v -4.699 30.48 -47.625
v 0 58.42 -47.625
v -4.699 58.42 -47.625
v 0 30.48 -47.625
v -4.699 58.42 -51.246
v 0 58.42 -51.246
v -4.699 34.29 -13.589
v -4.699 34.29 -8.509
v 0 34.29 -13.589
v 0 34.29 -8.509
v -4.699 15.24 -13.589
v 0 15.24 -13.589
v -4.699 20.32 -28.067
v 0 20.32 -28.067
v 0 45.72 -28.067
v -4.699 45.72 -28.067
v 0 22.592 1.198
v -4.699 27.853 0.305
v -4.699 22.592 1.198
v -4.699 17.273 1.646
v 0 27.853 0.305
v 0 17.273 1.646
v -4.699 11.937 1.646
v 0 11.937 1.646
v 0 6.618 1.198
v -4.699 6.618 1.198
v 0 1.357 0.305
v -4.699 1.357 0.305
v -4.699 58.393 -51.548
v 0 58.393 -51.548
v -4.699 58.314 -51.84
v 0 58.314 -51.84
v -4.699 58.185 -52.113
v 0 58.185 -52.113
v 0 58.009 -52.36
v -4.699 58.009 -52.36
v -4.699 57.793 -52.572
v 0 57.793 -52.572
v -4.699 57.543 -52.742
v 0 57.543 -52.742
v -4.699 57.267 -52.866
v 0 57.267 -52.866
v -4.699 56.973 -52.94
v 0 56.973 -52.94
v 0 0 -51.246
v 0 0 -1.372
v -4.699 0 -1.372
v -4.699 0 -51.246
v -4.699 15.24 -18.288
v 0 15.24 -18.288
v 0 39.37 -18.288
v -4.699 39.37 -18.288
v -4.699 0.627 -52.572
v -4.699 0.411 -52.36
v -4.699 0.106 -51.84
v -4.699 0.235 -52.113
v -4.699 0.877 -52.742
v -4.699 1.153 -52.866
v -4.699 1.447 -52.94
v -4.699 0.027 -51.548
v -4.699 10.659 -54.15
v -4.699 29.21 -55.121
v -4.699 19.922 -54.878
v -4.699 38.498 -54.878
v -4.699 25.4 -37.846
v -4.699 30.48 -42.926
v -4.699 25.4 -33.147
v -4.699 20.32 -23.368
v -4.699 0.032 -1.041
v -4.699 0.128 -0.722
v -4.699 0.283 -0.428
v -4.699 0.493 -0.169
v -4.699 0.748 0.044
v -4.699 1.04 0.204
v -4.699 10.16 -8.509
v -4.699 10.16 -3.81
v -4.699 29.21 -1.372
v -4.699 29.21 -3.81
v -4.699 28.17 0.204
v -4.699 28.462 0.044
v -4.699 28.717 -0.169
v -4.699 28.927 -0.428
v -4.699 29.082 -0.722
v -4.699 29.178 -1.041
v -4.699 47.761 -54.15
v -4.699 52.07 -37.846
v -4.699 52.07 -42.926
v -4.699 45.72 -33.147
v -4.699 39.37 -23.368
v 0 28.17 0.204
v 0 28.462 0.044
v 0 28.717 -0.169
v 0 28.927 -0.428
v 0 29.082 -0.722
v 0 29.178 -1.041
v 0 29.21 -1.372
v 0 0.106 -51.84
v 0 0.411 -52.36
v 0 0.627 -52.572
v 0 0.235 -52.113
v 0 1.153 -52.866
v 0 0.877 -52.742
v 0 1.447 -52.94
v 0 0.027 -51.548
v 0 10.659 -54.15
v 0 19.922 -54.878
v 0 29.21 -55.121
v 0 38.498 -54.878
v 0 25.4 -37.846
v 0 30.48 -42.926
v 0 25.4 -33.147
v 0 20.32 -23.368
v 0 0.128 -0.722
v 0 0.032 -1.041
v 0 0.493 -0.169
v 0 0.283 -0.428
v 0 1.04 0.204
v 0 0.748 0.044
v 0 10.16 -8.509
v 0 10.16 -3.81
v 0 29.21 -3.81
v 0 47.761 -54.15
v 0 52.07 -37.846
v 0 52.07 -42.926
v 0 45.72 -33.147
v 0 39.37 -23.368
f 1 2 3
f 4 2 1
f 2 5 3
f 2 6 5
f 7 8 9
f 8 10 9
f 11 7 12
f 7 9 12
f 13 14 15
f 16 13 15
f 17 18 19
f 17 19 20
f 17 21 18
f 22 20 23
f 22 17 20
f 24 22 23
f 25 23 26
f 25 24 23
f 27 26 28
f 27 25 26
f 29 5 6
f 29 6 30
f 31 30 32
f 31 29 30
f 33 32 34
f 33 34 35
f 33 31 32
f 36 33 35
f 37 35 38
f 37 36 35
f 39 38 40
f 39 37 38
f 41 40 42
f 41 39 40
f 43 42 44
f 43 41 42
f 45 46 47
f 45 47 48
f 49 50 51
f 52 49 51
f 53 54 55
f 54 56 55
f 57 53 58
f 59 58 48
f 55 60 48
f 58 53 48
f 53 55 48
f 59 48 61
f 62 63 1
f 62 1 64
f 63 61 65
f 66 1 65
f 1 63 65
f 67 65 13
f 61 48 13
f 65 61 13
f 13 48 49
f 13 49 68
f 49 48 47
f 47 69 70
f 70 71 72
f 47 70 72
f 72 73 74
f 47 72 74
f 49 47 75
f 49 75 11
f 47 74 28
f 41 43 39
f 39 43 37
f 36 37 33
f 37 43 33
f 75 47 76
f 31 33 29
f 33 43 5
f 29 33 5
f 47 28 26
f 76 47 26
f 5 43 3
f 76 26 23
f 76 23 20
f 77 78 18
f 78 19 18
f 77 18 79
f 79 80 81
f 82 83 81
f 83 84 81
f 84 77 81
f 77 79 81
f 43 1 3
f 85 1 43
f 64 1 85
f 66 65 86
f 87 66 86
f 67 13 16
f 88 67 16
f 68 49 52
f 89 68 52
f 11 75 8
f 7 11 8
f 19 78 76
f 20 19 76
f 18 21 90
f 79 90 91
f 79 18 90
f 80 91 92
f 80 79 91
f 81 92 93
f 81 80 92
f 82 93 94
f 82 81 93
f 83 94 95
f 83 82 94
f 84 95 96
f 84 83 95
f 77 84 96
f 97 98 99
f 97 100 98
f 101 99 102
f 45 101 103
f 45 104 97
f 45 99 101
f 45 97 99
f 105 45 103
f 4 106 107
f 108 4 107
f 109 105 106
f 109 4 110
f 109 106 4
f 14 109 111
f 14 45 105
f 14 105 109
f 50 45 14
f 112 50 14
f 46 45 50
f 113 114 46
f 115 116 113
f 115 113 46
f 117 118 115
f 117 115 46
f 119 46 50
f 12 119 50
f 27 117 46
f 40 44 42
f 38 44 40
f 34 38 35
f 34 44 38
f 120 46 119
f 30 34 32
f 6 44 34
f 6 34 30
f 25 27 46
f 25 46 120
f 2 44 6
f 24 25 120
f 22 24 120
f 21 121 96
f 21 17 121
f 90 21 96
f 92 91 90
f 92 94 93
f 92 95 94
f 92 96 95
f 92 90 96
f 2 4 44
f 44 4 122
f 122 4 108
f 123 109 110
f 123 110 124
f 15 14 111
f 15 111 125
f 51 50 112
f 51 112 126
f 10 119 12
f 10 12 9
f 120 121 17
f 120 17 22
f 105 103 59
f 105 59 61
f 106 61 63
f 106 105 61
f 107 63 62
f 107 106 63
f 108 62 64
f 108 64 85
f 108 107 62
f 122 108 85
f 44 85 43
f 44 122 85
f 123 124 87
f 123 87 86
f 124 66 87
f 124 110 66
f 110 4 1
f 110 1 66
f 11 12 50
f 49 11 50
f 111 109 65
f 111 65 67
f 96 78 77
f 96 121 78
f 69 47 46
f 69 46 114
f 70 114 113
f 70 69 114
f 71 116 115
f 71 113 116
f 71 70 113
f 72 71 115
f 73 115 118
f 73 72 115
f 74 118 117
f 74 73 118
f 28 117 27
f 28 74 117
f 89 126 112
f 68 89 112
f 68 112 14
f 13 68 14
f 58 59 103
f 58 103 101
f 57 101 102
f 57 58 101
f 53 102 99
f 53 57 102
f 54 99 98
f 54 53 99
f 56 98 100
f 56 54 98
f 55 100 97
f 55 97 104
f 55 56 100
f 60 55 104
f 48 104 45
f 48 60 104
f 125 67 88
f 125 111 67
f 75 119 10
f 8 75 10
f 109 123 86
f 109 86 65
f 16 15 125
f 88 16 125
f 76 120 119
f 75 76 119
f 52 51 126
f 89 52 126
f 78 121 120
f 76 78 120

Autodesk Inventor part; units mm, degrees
ref_plane "YZ Plane" through (0, 0, 0) normal (1, 0, 0) x (0, 1, 0)
ref_plane "XZ Plane" through (0, 0, 0) normal (0, 1, 0) x (-1, 0, 0)
ref_plane "XY Plane" through (0, 0, 0) normal (0, 0, 1) x (1, 0, 0)
sketch "Sketch1" plane through (0, 0, 0) normal (1, 0, 0) x (0, 1, 0)
  line L0 (0, 0) -> (58.42, 0) construction
  line L1 (58.42, 0) -> (58.42, -52.705) construction
  line L2 (58.42, -52.705) -> (0, -52.705) construction
  line L3 (0, -52.705) -> (0, 0) construction
  line L4 (0, 0) -> (0, -52.705)
  line L5 (0, -52.705) -> (58.42, -52.705) construction
  line L6 (29.21, -3.81) -> (10.16, -3.81)
  line L7 (10.16, -3.81) -> (10.16, -8.509)
  line L8 (10.16, -8.509) -> (34.29, -8.509)
  line L9 (34.29, -8.509) -> (34.29, -13.589)
  line L10 (34.29, -13.589) -> (15.24, -13.589)
  line L11 (15.24, -13.589) -> (15.24, -18.288)
  line L12 (29.21, -3.81) -> (29.21, 0)
  line L13 (0, 0) -> (29.21, 0) construction
  line L14 (15.24, -18.288) -> (39.37, -18.288)
  line L15 (39.37, -18.288) -> (39.37, -23.368)
  line L16 (39.37, -23.368) -> (20.32, -23.368)
  line L17 (20.32, -23.368) -> (20.32, -28.067)
  line L18 (20.32, -28.067) -> (45.72, -28.067)
  line L19 (45.72, -28.067) -> (45.72, -33.147)
  line L20 (58.42, -52.705) -> (58.42, -47.625)
  line L21 (58.42, -47.625) -> (30.48, -47.625)
  line L22 (30.48, -47.625) -> (30.48, -42.926)
  line L23 (30.48, -42.926) -> (52.07, -42.926)
  line L24 (52.07, -42.926) -> (52.07, -37.846)
  line L25 (52.07, -37.846) -> (25.4, -37.846)
  line L26 (25.4, -37.846) -> (25.4, -33.147)
  line L27 (25.4, -33.147) -> (45.72, -33.147)
  arc A0 (29.21, 0) -> (0, 0) centre (14.605, -61.7976) ccw
  arc A1 (0, -52.705) -> (58.42, -52.705) centre (29.21, 122.6792) ccw
  dimension "d0" = 52.705
  dimension "d1" = 58.42
  dimension "d2" = 4.699
  dimension "d3" = 3.81
  dimension "d5" = 5.08
  dimension "d6" = 5.08
  dimension "d7" = 4.699
  dimension "d8" = 10.16
  dimension "d9" = 19.05
  dimension "d10" = 19.05
  dimension "d11" = 5.08
  dimension "d12" = 4.699
  dimension "d13" = 5.08
  dimension "d14" = 19.05
  dimension "d15" = 5.08
  dimension "d18" = 4.699
  dimension "d19" = 4.699
  dimension "d22" = 5.08
  dimension "d28" = 5.08
  dimension "d35" = 63.5
  dimension "d36" = 177.8
  dimension "d39" = 5.08
  dimension "d40" = 6.35
  dimension "d42" = 5.08
  dimension "d43" = 6.35
  dimension "d44" = 6.35
extrude "Extrusion1" add sketch "Sketch1" against normal blind 4.699
fillet "Fillet1" radius 1.7145 4 edges at (-2.3495, 29.21, 0) (-2.3495, 0, 0) (-2.3495, 0, -52.705) (-2.3495, 58.42, -52.705)
equation "\"d2\" = thick"
equation "\"d6\" = 0.5 * d8"
equation "\"d7\" = thick"
equation "\"d12\" = thick"
equation "\"d13\" = d6"
equation "\"d18\" = thick"
equation "\"d19\" = thick"
equation "\"thick\" = 4.699"
properties part number "Head Frame"
